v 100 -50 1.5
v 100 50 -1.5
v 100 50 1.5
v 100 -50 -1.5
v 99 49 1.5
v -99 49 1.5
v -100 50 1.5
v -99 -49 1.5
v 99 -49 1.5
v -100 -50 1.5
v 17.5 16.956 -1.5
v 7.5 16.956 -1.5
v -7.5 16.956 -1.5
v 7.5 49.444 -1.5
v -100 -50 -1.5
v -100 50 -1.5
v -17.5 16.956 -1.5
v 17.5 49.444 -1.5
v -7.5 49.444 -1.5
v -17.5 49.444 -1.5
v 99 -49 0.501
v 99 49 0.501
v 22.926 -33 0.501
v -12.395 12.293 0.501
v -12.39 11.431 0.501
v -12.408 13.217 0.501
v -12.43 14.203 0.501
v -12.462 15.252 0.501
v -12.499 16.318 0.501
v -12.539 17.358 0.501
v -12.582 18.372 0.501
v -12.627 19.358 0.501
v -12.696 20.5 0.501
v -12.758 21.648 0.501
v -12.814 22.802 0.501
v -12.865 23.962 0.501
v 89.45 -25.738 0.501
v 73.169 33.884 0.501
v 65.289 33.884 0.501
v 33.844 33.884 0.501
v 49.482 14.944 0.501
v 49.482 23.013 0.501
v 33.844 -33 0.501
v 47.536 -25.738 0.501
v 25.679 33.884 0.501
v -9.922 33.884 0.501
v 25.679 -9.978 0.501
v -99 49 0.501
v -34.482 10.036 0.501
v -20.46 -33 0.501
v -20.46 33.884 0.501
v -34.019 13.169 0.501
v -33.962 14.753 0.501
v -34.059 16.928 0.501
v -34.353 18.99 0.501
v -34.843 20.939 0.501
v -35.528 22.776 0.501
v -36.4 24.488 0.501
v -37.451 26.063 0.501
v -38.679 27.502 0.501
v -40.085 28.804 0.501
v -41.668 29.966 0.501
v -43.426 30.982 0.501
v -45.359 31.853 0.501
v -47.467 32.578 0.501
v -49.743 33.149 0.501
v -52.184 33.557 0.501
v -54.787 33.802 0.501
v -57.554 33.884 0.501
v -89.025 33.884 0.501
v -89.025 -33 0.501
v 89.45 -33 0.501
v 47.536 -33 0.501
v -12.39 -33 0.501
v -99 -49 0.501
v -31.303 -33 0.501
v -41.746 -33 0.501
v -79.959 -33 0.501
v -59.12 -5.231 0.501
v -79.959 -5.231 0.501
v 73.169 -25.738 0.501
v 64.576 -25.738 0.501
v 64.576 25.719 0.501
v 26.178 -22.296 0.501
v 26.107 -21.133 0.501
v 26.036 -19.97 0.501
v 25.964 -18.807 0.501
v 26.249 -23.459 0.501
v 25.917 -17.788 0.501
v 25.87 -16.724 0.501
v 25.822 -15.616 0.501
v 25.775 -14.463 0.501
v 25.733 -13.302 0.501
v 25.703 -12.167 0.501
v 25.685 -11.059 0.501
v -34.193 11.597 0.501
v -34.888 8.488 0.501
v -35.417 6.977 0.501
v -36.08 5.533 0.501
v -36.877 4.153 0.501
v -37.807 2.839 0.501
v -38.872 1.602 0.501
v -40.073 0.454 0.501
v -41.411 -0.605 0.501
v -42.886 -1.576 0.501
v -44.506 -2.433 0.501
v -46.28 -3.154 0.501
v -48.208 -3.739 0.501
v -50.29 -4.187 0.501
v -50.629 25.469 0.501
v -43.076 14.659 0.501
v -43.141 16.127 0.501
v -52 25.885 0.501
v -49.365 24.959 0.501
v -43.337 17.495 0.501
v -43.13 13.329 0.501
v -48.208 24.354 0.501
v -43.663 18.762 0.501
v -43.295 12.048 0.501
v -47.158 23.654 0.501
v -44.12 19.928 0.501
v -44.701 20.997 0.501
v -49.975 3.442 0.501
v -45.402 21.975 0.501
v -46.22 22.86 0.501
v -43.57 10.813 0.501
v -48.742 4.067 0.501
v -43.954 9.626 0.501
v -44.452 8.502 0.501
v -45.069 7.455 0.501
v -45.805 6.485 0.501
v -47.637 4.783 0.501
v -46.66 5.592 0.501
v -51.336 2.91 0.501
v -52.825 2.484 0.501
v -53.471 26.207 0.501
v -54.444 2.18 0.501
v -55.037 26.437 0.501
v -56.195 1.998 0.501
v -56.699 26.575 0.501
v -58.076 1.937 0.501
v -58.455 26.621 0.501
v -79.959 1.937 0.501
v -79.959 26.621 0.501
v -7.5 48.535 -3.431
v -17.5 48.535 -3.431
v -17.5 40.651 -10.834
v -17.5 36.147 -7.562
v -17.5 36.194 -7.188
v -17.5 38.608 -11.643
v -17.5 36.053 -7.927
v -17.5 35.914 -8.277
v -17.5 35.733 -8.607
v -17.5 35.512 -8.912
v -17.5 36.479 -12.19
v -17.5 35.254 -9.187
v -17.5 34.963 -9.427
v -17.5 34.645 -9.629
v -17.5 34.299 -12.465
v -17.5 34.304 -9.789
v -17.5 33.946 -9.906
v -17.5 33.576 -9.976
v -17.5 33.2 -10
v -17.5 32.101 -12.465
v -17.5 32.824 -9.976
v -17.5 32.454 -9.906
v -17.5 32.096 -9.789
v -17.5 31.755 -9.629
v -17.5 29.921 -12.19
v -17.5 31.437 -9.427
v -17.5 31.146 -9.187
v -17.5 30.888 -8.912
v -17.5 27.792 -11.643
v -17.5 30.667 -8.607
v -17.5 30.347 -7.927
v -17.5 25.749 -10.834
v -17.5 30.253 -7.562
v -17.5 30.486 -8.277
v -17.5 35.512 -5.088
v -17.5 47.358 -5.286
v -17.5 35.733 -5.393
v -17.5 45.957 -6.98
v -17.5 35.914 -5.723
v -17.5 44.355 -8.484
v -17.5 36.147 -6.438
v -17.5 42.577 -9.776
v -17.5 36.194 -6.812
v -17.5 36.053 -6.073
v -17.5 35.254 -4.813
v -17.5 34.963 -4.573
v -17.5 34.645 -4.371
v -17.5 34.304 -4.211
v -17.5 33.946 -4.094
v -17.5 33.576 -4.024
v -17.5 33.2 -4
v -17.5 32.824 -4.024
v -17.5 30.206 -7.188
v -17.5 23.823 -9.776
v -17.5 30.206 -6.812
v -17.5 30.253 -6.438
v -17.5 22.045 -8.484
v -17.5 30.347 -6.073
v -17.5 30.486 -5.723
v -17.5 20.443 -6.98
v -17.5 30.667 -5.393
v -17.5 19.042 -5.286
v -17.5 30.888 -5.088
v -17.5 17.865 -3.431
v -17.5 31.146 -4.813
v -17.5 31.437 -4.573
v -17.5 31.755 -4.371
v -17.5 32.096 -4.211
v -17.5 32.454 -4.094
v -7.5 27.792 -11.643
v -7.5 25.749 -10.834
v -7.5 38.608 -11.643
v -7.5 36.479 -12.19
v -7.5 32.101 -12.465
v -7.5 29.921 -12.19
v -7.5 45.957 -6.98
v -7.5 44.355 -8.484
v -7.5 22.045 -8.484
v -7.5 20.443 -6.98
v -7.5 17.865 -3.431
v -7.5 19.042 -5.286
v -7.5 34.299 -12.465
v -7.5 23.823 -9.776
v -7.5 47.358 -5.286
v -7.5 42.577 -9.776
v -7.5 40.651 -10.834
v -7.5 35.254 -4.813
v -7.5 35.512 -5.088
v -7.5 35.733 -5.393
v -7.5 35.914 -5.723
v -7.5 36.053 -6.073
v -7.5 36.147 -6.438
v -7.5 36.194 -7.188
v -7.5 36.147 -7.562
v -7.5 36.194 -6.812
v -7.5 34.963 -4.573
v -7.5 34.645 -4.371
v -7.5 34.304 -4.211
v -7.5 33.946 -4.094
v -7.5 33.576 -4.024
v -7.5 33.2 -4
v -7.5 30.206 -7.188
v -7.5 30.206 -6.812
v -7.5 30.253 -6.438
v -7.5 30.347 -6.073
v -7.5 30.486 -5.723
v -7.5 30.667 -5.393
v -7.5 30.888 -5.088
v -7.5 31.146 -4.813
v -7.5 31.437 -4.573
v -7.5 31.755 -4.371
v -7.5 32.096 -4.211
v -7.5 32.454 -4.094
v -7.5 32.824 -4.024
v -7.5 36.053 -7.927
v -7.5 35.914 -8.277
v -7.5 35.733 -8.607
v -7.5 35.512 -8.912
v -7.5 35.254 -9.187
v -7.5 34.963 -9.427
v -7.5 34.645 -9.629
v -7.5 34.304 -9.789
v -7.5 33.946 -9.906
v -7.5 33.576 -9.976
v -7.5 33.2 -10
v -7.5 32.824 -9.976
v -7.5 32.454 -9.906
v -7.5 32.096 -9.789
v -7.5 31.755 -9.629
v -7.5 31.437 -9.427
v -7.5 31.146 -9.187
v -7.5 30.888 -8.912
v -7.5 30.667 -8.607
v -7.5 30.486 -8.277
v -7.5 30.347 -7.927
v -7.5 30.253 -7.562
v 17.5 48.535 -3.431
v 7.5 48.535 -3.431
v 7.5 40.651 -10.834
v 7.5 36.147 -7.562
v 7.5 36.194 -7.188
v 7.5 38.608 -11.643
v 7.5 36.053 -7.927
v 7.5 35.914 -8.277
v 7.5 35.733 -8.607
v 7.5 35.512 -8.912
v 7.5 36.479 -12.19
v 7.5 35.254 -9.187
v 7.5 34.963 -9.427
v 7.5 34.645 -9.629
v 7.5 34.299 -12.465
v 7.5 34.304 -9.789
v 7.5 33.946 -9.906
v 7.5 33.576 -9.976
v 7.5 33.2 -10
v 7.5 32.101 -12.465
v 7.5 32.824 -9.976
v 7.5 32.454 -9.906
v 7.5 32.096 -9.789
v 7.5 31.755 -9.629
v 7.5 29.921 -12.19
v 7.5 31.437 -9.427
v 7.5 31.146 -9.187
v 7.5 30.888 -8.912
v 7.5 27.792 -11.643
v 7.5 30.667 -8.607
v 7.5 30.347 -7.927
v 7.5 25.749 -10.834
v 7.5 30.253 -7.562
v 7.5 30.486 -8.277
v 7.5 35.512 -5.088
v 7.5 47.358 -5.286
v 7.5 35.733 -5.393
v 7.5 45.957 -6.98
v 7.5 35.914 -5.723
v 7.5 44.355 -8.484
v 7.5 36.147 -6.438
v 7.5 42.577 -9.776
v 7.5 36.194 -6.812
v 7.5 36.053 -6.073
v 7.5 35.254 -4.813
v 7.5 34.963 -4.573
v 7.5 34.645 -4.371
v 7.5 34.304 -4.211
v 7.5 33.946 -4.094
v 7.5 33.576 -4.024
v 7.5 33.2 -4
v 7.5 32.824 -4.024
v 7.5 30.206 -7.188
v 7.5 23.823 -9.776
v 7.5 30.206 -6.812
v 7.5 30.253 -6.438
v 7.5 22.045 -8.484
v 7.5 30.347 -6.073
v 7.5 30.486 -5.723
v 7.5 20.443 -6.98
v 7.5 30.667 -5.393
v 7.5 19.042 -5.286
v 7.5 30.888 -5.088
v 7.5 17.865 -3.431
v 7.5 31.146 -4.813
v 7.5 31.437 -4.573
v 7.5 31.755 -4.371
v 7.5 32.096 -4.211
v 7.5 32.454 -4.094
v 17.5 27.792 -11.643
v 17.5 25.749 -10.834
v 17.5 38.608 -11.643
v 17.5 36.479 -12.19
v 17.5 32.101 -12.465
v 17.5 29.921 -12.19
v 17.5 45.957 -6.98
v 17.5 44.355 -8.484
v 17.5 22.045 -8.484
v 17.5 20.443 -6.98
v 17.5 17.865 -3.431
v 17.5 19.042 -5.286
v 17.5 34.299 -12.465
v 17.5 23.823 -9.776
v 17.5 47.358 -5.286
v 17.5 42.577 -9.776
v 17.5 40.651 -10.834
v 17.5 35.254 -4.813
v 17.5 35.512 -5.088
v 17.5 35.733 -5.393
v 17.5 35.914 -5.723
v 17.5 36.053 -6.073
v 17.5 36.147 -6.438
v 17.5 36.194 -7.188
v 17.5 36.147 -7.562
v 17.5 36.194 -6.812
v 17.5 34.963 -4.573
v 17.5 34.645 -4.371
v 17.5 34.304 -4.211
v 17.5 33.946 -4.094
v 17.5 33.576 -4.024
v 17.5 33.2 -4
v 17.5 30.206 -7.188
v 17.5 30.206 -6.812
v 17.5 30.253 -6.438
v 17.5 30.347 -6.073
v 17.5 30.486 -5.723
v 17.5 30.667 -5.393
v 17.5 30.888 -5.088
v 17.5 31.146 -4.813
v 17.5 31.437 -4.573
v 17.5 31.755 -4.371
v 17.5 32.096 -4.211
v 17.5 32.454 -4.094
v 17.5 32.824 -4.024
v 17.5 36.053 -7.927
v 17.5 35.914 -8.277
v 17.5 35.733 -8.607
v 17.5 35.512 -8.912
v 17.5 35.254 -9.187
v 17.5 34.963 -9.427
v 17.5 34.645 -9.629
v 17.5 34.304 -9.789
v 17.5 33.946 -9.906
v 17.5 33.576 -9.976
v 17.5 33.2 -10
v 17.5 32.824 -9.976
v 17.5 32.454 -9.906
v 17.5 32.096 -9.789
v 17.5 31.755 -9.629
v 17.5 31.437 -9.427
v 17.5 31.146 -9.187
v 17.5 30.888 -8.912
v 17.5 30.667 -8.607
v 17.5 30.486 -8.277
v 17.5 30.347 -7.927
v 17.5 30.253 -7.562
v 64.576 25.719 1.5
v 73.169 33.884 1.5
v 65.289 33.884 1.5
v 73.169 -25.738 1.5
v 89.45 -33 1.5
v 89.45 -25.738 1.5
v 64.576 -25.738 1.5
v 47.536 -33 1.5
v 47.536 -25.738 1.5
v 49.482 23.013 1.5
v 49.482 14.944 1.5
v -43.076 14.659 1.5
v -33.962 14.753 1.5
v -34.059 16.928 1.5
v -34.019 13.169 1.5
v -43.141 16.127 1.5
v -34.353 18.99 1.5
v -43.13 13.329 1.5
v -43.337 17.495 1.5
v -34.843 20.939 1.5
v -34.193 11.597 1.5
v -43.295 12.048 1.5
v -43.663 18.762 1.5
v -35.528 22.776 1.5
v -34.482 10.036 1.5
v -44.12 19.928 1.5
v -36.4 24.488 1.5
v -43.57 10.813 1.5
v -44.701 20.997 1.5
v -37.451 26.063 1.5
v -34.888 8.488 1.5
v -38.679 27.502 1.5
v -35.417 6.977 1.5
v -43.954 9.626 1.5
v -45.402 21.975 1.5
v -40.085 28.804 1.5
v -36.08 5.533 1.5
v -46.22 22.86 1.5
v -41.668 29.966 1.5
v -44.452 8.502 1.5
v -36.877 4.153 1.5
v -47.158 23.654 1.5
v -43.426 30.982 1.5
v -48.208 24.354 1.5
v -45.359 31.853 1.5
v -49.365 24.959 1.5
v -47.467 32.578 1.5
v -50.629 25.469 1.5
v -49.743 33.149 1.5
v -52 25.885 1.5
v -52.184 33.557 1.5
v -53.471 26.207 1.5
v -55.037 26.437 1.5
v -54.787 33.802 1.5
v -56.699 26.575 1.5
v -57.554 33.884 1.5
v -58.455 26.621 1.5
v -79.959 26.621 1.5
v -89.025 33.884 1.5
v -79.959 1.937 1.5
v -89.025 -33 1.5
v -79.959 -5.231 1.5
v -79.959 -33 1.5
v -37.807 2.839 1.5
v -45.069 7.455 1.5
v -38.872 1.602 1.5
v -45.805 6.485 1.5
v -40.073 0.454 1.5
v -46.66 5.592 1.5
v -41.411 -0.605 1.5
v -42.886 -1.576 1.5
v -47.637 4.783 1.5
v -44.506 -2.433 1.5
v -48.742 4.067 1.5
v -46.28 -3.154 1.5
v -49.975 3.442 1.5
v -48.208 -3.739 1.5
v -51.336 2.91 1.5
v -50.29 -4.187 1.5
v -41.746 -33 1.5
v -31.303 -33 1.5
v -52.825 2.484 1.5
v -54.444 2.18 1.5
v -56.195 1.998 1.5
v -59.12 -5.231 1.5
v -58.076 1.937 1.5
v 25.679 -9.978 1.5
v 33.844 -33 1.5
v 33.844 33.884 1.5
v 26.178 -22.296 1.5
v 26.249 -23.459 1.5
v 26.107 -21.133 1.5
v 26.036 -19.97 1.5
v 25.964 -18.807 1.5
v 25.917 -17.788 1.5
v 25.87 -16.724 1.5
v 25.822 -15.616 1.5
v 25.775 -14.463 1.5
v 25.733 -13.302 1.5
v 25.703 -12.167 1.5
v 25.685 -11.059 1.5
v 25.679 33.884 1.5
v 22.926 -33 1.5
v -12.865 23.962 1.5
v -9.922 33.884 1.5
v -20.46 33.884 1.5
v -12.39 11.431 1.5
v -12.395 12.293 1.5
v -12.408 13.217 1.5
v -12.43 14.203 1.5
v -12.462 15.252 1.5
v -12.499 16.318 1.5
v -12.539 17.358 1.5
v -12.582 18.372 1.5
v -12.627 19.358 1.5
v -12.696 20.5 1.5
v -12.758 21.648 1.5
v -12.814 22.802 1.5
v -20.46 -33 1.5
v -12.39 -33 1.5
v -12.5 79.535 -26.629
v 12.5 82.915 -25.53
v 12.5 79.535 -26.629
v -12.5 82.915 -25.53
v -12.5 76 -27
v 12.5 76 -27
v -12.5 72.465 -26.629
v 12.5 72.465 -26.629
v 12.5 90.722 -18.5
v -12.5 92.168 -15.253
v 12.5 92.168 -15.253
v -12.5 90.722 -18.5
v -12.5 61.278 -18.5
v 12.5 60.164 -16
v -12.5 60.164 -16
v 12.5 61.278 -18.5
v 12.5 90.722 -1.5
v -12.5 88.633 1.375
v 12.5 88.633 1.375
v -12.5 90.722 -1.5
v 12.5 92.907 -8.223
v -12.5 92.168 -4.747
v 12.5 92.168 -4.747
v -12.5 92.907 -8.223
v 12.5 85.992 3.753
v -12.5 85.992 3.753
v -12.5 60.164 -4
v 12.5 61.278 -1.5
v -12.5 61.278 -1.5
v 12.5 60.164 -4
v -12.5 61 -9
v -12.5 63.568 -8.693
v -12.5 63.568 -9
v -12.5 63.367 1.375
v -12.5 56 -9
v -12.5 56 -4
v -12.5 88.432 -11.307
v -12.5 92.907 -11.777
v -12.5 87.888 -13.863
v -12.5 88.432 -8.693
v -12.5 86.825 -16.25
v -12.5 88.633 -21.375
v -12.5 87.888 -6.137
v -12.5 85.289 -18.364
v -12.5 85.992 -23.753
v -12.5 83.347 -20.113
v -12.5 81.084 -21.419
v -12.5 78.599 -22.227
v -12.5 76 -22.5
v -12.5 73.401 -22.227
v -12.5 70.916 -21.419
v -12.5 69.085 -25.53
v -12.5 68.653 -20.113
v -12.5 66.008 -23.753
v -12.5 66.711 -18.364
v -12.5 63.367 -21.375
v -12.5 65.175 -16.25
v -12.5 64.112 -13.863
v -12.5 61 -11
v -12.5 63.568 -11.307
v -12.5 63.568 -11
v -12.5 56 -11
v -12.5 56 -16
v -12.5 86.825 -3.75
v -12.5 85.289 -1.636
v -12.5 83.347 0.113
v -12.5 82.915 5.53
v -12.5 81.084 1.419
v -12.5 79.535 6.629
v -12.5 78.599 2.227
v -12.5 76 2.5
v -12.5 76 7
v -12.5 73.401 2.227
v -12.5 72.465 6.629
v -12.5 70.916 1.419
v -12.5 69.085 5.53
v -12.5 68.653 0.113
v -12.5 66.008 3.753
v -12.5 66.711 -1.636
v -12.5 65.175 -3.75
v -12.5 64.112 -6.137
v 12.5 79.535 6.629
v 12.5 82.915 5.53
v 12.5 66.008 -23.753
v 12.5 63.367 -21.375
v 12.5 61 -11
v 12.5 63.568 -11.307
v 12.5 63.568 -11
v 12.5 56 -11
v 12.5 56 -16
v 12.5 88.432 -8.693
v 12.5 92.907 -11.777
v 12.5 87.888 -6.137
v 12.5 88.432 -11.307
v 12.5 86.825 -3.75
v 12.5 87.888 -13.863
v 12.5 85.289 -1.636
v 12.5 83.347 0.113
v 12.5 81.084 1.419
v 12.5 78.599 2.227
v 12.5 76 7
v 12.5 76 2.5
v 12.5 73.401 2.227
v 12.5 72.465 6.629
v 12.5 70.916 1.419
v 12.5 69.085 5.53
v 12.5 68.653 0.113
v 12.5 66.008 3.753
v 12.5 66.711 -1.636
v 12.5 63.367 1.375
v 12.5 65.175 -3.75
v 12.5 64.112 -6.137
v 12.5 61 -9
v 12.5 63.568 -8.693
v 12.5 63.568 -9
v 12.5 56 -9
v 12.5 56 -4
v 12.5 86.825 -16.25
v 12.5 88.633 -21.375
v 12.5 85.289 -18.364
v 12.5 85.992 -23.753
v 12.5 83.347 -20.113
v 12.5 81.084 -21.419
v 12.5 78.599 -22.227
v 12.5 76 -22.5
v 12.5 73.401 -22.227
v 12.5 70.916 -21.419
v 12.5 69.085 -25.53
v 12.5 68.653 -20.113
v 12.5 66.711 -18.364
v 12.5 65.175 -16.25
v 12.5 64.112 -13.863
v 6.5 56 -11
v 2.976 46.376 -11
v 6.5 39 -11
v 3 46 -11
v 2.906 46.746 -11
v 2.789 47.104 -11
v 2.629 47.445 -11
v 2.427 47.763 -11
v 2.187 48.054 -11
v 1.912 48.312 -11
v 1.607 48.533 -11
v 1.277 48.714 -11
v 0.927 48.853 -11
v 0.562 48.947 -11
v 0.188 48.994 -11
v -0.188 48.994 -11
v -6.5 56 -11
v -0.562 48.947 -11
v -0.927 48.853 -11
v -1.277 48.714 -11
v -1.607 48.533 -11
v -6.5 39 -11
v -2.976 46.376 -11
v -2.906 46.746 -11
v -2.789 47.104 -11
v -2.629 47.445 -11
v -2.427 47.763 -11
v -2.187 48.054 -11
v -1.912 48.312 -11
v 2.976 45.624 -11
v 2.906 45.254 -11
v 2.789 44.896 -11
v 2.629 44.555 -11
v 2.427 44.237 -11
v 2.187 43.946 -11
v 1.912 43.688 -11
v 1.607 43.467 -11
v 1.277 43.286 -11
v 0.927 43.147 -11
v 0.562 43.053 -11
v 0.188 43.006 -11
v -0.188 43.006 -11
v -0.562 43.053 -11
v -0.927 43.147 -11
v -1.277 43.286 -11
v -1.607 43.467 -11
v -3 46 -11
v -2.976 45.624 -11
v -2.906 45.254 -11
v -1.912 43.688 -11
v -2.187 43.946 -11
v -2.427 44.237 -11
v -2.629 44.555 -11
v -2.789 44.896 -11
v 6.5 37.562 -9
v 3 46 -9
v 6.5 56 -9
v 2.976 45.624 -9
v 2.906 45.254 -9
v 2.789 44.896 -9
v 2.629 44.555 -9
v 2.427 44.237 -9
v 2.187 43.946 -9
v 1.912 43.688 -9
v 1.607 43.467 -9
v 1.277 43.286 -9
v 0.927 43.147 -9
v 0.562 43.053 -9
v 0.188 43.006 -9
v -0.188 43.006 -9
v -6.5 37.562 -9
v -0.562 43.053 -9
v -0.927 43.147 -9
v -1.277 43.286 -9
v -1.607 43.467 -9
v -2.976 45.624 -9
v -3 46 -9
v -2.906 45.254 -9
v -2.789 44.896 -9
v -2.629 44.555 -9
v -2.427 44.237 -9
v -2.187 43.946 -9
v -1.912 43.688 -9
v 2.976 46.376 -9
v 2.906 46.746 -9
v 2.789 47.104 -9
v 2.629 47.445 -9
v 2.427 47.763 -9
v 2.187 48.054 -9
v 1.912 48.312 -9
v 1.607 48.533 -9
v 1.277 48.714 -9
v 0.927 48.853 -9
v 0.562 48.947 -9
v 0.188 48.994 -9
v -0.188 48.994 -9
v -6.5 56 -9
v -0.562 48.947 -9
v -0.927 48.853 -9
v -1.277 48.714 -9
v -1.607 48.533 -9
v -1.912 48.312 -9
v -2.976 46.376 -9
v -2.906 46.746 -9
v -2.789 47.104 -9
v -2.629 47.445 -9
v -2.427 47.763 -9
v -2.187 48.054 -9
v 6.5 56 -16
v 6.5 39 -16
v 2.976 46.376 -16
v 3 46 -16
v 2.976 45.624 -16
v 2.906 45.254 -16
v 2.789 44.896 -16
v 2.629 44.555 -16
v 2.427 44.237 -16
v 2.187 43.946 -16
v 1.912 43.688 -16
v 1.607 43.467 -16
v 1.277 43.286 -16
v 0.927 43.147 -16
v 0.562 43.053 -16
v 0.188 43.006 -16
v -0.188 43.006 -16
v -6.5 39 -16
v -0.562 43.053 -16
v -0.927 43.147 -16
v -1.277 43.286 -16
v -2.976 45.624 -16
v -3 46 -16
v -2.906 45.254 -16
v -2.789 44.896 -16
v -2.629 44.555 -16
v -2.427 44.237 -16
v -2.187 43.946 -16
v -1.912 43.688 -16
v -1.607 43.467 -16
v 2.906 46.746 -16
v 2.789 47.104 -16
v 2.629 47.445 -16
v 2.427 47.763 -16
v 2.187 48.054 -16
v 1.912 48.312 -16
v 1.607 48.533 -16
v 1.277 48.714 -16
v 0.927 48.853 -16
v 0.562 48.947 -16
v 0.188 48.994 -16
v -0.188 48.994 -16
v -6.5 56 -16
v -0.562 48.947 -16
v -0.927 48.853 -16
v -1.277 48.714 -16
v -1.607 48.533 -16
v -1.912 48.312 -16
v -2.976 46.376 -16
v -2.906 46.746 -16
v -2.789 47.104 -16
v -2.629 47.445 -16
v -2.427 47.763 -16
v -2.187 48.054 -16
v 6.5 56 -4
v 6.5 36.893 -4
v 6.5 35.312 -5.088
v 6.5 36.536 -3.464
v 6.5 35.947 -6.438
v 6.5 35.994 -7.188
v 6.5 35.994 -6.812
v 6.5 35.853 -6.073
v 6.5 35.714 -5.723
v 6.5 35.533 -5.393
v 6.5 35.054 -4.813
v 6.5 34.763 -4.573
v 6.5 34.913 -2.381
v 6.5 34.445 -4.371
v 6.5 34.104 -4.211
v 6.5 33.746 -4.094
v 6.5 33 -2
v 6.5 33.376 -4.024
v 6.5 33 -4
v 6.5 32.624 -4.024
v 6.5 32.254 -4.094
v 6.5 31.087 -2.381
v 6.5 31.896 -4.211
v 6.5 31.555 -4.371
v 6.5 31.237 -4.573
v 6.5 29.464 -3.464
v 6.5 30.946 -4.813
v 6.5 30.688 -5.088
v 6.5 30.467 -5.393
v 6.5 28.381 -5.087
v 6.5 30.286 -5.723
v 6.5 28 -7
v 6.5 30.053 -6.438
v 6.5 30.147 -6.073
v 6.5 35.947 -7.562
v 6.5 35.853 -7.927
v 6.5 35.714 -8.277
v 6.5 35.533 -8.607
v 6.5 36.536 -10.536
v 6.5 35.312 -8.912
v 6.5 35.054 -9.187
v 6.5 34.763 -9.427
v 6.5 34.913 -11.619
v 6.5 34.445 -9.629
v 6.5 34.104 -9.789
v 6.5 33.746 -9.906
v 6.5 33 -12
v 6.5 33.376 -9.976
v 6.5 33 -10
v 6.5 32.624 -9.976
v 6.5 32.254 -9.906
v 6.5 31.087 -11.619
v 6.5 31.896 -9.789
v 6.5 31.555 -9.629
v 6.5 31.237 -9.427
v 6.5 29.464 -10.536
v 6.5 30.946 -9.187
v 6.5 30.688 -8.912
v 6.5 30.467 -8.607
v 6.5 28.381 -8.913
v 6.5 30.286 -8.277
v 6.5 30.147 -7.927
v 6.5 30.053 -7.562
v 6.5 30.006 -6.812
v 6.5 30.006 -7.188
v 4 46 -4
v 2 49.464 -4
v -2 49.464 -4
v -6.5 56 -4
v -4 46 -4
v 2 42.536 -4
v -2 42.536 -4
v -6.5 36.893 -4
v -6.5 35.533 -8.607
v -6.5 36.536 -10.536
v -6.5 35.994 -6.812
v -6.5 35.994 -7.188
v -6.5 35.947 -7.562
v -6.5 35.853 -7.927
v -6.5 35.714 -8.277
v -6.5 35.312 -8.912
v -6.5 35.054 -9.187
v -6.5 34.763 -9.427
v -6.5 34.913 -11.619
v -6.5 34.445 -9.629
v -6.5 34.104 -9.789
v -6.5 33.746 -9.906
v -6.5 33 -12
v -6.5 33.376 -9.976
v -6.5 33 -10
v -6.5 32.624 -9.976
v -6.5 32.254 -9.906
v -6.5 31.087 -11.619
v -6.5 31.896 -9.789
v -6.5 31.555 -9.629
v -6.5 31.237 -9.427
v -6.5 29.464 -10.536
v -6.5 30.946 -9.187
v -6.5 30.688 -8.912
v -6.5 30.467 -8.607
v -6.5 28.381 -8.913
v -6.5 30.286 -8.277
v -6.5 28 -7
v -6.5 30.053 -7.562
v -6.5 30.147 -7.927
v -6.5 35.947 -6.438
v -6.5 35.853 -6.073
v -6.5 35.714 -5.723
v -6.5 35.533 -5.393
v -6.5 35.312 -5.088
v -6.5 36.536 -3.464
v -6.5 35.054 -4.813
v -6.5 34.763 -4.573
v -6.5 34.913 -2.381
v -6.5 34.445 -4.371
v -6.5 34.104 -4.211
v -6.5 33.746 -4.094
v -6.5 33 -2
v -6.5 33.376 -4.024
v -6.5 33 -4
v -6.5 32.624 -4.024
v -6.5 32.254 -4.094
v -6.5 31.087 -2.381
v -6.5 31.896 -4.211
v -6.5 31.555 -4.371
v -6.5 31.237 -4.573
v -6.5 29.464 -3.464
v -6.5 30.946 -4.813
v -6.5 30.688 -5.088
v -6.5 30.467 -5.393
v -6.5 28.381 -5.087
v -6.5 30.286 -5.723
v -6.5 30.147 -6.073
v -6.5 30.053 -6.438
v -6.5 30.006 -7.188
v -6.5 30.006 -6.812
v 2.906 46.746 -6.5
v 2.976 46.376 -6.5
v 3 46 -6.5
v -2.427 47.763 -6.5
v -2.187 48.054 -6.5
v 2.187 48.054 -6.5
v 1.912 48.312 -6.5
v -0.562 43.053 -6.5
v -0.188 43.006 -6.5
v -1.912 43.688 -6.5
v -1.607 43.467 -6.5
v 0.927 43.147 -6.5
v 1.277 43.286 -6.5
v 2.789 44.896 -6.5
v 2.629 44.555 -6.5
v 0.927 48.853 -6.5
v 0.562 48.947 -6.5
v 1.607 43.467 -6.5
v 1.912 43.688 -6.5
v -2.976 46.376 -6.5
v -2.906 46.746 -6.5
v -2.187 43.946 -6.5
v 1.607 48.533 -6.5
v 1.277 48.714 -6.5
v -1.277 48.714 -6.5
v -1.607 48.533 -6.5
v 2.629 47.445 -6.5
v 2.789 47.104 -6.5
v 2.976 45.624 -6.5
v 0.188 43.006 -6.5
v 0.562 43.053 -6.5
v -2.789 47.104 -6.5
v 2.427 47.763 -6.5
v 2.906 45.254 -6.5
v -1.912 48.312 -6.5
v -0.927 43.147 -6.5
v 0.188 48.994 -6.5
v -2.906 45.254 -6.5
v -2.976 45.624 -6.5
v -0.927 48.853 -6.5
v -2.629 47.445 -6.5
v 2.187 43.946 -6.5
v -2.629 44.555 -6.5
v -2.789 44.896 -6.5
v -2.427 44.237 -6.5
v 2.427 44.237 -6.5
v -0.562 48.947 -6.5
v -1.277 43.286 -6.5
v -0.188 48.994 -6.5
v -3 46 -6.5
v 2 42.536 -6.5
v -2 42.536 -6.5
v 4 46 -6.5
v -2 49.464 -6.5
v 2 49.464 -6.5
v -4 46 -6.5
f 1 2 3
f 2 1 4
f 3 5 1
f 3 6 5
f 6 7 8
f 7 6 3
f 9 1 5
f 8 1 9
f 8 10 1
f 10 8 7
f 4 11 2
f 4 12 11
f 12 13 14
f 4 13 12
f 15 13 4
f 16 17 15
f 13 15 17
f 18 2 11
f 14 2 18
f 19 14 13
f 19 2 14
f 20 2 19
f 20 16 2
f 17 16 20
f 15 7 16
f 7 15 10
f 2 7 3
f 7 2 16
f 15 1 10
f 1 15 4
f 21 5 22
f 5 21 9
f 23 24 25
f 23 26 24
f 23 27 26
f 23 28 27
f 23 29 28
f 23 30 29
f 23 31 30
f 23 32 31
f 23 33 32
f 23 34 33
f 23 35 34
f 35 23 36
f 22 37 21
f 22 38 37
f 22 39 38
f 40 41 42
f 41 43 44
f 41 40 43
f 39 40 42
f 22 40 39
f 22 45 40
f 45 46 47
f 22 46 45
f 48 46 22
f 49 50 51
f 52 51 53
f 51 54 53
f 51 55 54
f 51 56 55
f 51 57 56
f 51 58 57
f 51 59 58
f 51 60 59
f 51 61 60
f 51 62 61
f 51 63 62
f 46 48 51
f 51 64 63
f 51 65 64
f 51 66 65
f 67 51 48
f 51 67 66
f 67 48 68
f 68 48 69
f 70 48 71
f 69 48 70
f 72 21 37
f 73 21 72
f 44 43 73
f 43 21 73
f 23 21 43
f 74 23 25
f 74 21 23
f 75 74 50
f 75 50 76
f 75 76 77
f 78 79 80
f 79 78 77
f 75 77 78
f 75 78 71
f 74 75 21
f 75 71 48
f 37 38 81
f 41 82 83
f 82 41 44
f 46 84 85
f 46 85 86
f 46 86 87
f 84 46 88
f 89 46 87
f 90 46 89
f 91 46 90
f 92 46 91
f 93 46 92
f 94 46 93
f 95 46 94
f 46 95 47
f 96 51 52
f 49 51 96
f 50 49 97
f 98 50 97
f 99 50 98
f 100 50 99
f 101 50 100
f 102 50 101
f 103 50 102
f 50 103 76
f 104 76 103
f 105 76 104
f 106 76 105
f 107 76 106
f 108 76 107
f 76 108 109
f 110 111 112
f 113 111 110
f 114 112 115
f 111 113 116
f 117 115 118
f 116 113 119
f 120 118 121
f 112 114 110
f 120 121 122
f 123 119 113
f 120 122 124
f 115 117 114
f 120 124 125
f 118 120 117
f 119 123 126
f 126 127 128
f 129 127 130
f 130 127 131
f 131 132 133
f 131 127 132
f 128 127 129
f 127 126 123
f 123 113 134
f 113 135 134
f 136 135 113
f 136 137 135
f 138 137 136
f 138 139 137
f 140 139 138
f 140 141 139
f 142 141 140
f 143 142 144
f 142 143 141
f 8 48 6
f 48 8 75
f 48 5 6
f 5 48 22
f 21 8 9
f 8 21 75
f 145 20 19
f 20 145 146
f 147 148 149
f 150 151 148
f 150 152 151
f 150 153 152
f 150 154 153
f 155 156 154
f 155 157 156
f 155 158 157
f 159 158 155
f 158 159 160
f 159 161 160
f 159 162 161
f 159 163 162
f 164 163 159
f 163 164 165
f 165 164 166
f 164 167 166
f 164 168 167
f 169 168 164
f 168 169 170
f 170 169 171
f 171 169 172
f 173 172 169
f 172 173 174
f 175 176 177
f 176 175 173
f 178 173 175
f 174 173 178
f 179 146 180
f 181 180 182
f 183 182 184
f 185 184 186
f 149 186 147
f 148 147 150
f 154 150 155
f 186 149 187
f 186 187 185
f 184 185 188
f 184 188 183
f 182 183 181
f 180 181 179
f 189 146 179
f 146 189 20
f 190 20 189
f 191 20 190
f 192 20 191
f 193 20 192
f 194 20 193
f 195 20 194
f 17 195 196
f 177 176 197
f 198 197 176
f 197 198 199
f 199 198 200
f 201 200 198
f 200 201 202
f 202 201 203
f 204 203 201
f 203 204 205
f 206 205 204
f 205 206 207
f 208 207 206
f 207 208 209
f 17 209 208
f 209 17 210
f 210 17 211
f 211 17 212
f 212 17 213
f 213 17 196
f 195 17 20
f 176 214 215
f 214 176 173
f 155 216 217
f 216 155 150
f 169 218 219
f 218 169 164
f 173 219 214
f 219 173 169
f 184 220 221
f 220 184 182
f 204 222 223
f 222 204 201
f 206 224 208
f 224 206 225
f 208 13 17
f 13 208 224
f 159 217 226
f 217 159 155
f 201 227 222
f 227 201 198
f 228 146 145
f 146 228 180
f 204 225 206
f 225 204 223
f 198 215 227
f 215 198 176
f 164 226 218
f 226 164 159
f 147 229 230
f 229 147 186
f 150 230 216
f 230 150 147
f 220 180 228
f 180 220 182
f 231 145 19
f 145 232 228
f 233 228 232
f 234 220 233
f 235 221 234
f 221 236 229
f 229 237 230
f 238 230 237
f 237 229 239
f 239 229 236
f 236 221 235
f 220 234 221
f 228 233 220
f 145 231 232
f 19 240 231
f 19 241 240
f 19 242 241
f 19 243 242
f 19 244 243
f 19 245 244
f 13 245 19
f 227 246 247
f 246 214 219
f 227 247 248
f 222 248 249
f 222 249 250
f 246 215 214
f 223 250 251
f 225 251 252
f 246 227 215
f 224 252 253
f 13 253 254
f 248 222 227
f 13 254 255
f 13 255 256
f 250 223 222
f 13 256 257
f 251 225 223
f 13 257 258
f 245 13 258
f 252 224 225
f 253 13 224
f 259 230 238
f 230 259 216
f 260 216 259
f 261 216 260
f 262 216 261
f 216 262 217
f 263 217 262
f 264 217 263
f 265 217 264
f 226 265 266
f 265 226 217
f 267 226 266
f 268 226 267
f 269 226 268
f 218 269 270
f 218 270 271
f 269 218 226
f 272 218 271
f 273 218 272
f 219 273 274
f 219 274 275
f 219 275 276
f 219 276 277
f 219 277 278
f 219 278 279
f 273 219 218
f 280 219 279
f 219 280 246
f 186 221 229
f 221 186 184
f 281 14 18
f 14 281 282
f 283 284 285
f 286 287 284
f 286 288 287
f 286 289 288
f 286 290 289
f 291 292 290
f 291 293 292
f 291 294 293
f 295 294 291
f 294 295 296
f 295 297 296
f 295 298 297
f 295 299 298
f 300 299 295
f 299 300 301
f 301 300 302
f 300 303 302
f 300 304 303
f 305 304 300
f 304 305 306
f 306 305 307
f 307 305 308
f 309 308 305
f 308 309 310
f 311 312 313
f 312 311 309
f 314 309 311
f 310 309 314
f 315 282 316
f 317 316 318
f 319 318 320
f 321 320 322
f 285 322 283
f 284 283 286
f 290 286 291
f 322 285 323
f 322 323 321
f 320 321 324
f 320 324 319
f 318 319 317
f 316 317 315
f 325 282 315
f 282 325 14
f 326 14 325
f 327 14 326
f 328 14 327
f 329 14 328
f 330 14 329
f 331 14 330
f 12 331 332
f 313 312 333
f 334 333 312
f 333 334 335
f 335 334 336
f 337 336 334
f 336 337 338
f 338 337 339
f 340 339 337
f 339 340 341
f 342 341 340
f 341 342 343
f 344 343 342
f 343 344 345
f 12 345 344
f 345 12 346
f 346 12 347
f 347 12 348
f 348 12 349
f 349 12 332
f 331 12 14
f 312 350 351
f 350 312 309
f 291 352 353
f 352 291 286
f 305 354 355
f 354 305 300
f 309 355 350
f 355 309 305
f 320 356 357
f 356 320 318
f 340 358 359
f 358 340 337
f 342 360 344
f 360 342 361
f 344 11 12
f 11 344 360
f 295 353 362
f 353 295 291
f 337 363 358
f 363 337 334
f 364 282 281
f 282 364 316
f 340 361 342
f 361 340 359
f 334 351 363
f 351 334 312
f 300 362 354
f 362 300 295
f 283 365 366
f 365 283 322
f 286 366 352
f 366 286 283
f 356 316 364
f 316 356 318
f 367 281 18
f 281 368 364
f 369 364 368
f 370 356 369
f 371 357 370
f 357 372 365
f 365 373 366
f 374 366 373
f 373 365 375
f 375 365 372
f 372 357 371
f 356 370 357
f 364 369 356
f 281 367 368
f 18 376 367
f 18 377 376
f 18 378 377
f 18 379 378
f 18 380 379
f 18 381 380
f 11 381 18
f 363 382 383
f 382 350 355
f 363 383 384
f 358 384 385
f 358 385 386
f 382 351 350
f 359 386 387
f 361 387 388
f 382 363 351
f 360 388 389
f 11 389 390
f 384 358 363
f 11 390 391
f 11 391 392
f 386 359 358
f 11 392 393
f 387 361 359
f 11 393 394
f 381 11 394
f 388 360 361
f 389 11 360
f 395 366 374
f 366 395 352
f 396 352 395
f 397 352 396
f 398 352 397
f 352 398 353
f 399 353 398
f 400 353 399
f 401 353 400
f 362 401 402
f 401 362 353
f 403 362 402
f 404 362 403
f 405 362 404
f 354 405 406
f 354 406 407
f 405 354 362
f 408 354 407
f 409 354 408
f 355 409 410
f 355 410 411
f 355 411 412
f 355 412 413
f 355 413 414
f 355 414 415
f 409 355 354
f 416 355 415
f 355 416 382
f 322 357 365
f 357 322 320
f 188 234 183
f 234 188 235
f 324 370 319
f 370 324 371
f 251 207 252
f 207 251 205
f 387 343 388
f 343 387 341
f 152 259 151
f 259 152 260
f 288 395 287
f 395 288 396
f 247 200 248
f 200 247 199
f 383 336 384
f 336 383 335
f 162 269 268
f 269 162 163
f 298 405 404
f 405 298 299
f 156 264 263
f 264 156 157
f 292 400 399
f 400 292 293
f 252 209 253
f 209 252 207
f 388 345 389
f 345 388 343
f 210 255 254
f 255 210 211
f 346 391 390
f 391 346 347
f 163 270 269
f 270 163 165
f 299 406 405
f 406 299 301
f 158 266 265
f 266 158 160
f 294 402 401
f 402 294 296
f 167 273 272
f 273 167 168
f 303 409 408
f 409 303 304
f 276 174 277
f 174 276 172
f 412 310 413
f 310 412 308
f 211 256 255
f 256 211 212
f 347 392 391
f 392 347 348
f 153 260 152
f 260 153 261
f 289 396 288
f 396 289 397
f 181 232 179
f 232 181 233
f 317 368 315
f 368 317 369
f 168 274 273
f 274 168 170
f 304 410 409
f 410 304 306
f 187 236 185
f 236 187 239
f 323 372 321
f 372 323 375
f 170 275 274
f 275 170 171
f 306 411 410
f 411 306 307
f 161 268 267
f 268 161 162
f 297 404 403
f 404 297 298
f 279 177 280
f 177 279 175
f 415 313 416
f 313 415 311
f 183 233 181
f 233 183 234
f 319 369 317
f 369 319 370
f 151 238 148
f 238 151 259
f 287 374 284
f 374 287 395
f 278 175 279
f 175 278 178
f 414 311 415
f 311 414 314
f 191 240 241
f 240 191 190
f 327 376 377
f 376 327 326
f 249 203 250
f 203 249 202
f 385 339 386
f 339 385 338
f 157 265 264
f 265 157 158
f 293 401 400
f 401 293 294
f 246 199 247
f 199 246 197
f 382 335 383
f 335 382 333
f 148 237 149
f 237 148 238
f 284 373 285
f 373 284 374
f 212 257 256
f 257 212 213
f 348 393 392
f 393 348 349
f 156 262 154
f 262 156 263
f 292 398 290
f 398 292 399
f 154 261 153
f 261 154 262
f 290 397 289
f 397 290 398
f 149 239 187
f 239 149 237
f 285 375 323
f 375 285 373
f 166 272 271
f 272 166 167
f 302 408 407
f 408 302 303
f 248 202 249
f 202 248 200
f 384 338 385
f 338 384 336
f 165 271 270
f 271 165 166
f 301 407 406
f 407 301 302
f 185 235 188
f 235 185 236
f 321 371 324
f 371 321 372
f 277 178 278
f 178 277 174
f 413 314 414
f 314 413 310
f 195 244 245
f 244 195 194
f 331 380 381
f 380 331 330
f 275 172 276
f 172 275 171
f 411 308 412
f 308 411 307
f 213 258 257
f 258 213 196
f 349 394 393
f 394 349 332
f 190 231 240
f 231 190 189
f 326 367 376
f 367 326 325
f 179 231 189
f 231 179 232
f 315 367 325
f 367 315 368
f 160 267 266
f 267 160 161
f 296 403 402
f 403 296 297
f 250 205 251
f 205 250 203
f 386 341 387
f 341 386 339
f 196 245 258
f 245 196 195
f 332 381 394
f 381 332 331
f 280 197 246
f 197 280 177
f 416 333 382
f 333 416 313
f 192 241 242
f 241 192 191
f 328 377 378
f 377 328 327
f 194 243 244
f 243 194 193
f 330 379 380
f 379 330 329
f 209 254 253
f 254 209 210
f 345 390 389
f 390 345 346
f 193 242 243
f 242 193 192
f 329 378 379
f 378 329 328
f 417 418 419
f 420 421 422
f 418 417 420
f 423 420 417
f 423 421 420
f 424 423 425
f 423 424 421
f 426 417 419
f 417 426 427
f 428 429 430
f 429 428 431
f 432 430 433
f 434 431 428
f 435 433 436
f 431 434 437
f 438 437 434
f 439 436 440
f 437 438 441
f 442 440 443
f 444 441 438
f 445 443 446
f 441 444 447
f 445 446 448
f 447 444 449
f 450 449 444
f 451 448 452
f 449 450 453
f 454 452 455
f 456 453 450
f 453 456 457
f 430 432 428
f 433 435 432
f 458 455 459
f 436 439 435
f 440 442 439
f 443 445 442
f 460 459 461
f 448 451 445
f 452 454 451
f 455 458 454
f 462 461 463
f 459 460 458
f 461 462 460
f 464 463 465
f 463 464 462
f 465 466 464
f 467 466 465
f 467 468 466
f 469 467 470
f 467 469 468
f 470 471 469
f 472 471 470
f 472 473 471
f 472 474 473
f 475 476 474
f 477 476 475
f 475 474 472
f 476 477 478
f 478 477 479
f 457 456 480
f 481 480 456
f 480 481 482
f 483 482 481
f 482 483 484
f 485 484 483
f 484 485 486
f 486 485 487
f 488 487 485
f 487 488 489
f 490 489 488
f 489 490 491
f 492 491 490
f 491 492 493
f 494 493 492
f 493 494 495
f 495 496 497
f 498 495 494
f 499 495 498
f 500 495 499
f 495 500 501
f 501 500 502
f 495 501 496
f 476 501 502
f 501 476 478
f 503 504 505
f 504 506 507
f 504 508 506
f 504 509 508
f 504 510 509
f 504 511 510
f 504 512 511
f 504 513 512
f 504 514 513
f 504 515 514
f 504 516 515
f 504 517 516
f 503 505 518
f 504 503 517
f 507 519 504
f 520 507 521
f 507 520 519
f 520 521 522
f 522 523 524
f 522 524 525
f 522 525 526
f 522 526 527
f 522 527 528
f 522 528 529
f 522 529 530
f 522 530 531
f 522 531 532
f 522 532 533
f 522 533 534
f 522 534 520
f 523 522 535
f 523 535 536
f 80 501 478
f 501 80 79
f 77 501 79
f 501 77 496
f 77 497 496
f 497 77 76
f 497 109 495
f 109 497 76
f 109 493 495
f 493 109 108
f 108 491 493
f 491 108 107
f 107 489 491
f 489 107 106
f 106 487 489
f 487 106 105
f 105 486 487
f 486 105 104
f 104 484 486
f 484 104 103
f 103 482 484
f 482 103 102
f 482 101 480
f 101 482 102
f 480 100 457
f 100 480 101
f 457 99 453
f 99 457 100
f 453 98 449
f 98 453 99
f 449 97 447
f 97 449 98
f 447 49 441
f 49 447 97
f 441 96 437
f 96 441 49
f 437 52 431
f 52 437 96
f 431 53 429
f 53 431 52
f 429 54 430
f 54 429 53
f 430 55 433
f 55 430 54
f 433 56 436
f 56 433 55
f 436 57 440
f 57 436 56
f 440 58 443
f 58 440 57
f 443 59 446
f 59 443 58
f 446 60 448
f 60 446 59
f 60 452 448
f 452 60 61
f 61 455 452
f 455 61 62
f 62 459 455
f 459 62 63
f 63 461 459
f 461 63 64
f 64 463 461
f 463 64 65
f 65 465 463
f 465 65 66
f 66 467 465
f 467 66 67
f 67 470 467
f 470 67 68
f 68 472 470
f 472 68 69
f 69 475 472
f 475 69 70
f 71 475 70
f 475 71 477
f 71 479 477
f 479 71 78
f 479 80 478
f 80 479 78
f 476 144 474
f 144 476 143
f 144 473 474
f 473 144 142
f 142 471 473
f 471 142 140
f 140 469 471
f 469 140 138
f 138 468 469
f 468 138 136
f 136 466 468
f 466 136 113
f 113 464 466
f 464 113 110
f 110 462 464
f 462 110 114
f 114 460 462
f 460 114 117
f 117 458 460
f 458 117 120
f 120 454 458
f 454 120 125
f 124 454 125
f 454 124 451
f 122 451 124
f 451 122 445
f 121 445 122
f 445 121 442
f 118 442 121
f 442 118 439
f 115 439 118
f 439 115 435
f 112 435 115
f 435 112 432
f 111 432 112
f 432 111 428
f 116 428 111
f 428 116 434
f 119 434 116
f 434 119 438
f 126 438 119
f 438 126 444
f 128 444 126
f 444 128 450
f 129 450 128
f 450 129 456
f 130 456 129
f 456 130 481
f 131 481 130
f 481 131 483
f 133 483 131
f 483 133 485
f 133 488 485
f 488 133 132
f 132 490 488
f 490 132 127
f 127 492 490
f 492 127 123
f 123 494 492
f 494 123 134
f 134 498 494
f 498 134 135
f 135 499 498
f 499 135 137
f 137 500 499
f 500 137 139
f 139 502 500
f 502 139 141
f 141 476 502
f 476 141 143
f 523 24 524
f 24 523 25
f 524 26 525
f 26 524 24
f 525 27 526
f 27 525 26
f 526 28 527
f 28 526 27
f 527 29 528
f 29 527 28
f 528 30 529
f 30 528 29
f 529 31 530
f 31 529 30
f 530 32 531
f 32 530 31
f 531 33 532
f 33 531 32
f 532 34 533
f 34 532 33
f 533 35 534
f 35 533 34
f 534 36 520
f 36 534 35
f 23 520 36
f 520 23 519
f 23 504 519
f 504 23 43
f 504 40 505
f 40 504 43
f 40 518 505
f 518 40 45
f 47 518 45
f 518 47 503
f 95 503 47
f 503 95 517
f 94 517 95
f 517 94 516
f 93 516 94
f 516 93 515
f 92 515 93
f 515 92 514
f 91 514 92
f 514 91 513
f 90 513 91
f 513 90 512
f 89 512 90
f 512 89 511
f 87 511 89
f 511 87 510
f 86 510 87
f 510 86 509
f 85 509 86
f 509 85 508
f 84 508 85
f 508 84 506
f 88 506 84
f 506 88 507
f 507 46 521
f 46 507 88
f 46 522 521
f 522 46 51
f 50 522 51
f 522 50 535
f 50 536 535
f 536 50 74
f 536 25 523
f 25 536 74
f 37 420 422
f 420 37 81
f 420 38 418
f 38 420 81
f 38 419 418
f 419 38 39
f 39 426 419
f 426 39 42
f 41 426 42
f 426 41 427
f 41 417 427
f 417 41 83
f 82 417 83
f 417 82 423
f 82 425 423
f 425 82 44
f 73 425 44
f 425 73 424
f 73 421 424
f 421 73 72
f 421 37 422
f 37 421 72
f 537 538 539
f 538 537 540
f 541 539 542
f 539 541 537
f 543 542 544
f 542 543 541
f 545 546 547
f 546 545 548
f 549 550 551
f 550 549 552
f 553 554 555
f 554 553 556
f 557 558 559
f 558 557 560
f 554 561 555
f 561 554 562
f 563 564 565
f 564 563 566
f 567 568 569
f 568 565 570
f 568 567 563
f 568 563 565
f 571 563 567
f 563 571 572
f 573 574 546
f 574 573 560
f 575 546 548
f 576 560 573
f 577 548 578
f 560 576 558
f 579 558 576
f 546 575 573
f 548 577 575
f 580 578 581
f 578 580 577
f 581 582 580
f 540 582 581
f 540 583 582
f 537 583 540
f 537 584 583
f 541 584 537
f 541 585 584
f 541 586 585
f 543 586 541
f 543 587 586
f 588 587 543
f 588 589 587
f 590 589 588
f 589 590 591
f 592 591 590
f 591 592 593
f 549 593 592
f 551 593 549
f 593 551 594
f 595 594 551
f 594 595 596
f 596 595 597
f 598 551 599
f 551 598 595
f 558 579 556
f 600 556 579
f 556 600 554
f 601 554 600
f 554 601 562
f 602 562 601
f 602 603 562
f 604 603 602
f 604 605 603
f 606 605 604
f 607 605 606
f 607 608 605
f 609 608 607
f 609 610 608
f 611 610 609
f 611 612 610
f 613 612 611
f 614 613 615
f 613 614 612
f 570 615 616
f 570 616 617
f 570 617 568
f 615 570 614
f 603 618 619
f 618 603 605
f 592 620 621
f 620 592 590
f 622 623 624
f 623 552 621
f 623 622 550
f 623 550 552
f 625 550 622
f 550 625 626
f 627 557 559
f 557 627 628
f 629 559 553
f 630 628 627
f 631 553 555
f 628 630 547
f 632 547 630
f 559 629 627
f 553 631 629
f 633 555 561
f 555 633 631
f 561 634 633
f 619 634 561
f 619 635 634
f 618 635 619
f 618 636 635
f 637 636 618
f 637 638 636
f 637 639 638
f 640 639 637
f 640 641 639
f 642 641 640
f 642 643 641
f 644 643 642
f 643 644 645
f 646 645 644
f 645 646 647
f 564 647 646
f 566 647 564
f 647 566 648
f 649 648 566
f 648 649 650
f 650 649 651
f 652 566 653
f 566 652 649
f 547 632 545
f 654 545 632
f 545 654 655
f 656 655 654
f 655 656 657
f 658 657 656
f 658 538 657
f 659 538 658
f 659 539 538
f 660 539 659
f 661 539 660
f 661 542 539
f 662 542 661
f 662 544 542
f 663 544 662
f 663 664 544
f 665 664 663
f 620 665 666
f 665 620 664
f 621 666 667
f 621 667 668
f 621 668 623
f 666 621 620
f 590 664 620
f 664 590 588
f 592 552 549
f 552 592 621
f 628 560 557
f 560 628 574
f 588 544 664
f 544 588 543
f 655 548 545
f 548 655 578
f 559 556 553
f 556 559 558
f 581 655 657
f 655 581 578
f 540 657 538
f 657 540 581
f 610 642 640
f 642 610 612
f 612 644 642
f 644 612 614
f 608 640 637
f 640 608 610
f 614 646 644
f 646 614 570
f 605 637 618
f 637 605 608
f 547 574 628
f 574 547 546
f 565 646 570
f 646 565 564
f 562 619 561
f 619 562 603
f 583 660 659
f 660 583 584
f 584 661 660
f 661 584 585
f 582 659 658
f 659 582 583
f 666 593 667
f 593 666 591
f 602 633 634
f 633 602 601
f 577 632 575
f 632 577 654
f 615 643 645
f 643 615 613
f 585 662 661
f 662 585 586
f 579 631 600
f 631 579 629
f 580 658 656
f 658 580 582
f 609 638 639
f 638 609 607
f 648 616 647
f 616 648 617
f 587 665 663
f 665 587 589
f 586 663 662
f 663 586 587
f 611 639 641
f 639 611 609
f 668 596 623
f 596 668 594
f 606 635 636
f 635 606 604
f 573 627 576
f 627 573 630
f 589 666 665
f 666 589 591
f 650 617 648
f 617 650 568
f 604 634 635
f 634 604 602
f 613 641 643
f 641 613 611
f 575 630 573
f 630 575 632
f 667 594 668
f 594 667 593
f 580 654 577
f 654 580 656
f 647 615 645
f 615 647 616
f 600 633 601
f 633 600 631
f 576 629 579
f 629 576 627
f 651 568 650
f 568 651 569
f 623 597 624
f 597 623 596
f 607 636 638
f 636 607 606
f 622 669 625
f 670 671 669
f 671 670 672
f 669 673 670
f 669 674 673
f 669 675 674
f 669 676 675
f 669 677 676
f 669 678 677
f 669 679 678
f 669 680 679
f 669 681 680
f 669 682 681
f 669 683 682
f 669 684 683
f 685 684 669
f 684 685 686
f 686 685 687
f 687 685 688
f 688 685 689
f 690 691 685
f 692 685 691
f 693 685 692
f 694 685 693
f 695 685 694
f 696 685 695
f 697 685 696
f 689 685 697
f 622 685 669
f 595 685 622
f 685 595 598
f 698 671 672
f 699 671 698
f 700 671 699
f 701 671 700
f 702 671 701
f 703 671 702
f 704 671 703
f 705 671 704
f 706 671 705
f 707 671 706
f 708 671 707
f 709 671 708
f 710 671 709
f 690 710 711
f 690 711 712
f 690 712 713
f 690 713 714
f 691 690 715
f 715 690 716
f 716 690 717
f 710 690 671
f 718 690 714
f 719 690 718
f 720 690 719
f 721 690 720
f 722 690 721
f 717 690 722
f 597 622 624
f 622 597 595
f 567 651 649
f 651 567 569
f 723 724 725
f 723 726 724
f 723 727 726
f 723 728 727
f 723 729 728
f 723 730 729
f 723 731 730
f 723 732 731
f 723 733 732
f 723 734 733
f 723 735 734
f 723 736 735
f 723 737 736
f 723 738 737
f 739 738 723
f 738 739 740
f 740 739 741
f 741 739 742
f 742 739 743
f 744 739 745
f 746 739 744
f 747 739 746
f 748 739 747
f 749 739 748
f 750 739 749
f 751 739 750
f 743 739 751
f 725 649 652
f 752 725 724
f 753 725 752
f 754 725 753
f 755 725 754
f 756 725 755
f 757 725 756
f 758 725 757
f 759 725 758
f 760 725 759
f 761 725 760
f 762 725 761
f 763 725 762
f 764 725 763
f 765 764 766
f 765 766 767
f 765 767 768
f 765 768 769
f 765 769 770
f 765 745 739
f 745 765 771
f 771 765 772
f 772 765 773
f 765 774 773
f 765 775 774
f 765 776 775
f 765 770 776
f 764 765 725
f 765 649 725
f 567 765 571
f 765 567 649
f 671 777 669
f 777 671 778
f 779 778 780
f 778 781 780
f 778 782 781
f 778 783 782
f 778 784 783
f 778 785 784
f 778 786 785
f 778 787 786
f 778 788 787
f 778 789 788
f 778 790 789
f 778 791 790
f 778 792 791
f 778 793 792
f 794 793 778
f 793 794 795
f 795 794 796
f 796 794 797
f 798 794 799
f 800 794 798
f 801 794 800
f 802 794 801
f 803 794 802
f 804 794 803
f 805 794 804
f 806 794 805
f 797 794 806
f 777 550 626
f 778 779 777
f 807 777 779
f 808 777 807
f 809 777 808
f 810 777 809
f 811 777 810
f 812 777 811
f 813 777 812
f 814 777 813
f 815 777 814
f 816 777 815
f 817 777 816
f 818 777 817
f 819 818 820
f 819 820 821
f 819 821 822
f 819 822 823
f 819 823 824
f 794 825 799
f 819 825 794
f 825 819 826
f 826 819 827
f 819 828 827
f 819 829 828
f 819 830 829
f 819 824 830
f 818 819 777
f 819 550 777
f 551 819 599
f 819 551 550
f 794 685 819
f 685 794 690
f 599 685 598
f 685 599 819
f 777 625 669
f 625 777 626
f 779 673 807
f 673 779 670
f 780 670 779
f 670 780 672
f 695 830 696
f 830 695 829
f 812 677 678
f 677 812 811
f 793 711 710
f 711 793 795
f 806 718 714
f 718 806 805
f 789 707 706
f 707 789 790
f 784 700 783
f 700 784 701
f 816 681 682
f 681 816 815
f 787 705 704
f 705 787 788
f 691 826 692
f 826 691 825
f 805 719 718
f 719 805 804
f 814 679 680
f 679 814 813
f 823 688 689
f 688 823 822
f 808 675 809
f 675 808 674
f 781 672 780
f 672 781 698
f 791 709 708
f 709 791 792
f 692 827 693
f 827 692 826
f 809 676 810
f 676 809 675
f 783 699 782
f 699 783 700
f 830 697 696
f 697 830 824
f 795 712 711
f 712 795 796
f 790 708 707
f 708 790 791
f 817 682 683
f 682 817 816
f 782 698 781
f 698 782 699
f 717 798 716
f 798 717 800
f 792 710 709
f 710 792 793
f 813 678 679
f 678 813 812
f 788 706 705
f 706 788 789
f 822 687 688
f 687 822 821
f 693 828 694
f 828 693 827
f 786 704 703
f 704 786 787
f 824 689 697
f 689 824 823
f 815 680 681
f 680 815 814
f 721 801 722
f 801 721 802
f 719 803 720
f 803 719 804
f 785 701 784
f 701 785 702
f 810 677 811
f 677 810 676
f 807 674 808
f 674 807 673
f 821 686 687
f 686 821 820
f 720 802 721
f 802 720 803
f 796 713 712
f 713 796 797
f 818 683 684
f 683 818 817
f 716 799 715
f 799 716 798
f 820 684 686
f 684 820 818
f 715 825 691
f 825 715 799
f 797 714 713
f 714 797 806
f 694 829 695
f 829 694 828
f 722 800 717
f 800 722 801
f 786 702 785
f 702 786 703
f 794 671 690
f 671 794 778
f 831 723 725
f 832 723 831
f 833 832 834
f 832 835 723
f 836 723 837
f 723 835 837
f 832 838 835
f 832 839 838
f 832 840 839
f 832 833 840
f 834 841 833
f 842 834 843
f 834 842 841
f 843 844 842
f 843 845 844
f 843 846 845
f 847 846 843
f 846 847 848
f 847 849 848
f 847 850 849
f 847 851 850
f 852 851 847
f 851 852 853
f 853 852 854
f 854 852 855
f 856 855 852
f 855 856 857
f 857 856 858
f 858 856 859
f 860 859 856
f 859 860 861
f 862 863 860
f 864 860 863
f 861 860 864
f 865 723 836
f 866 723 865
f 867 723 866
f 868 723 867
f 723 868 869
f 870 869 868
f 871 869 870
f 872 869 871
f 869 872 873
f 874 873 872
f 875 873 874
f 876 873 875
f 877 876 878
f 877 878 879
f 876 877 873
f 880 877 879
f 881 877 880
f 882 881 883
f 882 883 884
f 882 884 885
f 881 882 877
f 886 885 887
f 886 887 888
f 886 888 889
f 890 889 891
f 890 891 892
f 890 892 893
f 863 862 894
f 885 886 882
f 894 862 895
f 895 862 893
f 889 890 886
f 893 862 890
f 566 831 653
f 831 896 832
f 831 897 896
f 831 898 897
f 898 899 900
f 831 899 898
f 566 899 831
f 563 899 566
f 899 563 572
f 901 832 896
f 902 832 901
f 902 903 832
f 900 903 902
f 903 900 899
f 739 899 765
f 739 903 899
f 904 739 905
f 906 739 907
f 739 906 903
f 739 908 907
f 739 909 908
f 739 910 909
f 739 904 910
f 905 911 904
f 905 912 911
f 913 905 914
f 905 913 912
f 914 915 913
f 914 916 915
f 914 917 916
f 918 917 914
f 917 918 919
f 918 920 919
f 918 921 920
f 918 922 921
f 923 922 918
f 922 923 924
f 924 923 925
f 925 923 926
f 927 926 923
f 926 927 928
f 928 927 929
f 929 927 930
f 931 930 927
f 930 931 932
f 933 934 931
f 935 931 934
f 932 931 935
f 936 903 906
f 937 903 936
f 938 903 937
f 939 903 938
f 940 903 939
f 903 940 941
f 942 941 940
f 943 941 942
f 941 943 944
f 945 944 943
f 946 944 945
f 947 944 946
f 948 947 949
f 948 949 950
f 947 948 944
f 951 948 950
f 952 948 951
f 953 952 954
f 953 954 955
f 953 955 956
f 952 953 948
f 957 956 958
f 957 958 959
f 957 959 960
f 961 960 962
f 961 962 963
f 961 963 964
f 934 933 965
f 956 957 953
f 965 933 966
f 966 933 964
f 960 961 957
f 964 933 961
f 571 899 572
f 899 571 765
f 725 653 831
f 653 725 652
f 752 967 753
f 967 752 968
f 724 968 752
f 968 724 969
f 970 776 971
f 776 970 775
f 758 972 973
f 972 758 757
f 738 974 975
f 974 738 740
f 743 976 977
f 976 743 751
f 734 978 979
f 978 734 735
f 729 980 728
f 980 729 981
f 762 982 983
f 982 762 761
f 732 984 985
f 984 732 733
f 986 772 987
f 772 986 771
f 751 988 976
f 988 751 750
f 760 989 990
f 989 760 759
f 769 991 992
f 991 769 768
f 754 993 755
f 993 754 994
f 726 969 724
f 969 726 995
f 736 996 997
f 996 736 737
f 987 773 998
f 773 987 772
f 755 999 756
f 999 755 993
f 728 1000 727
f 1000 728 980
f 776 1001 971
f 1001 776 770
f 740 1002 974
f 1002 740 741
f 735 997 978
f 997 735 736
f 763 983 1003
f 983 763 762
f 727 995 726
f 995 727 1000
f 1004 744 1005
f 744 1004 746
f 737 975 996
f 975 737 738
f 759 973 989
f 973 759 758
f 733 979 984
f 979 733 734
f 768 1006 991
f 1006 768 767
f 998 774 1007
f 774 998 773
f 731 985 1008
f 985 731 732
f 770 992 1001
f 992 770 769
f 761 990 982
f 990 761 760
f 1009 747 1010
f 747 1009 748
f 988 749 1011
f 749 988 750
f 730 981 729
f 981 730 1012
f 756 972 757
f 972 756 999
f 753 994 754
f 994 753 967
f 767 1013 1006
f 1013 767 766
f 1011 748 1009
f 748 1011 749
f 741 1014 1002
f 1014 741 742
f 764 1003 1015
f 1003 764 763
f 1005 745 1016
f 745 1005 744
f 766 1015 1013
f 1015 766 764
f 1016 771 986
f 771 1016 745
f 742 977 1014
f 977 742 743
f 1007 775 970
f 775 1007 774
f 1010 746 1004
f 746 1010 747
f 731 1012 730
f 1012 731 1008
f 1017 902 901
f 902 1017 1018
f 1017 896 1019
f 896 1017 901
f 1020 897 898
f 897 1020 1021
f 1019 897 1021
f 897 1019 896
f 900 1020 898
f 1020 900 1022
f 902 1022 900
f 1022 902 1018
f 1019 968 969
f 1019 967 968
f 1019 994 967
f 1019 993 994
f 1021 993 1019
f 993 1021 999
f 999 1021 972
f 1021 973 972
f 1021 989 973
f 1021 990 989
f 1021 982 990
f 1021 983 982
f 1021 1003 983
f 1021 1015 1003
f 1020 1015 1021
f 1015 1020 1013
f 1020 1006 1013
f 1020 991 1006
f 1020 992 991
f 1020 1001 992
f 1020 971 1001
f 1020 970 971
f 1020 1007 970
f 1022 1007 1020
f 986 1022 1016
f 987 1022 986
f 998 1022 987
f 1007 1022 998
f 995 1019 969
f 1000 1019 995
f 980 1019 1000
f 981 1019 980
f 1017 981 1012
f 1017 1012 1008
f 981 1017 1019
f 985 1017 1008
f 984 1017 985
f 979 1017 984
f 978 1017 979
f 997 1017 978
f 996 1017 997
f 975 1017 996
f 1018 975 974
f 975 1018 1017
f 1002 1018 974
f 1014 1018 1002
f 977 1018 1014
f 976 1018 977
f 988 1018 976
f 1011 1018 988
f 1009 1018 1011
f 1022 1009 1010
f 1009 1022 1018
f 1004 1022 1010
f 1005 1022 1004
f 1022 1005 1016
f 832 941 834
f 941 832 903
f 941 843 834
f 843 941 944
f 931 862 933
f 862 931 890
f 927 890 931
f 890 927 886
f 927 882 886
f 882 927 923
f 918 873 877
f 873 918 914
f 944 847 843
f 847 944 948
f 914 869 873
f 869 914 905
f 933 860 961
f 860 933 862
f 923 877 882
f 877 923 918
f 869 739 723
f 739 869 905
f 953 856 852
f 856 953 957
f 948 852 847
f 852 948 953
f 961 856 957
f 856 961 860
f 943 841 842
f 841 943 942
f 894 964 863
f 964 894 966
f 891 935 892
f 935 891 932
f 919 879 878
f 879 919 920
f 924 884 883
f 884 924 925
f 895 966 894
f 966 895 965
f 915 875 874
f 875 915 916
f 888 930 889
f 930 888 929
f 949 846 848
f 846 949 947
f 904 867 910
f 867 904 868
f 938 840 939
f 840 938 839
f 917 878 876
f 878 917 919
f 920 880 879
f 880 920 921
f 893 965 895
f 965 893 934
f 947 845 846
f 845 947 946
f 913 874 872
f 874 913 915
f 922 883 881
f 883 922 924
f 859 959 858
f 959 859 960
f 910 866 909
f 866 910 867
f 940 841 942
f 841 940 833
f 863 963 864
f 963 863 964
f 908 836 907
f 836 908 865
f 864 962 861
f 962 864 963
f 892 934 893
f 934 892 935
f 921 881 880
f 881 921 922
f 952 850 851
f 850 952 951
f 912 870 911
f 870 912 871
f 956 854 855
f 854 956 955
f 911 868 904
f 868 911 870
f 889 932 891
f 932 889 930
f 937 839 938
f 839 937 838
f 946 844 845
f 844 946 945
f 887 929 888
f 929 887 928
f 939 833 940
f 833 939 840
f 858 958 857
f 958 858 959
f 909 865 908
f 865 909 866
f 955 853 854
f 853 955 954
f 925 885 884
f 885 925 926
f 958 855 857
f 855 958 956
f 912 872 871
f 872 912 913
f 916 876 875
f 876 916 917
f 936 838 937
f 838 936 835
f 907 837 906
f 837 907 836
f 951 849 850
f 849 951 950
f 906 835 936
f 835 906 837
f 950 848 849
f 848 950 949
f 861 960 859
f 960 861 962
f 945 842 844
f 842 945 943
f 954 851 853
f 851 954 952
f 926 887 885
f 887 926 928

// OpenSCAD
 /**
 * @file golfbuggyNumberPlate.scad
 *
 * @version 1.0
 *
 * @author Calum Judd Anderson
 *
 * @brief Golfbuggy numberplate
 */
INTERFERENCE_FIT = 0.001;
SLIDE_FIT = 0.05;

NUMBERPLATE_REG = "RN1";

/**
 * @brief Handlebar mount
 */
module handlebarMount() {
    mountBracketWidth = 13;

    union() {
        rotate([0, 90, 0])
            difference() {
                cylinder(25, 17, 17, center=true);
                cylinder(25 + INTERFERENCE_FIT, 12.5, 12.5, center=true);
                translate([0, -8, 0])
                    cube([2, 25, 34 + INTERFERENCE_FIT], center=true);
            }
            
            /* Body Between Number Plate Mount and Handlebar Mount */
            /* Top Mount */
            translate([0, 0, -8.5])
                union() {
                    translate([0, -17.5, 5])
                        cube([25, 5, 5], center=true);
                    
                    translate([0, -30, 5])
                        difference() {
                            cube([mountBracketWidth, 20, 5], center=true);
                            cylinder(5 + INTERFERENCE_FIT, 3, 3, center=true, $fn=50);
                            translate([0, -12, 0])
                                cube([mountBracketWidth + INTERFERENCE_FIT, 10, 5 + INTERFERENCE_FIT], center=true);
                        }
                }

            /* Bottom Mount */
            union() {
                translate([0, -17.5, 3.5])
                    cube([25, 5, 5], center=true);

                translate([0, -30, 3.5])
                    difference() {
                            cube([mountBracketWidth, 20, 5], center=true);
                            cylinder(5 + INTERFERENCE_FIT, 3, 3, center=true, $fn=50);
                            translate([0, 0, 0])
                            cylinder(3, 4, 4, $fn=6);
                        }
            }

            /* Circle Pick Up Between Number Plate Mounts */
            translate([-0, -43, 3])
                difference() {
                    rotate([0, 90, 0])
                        cylinder(mountBracketWidth, 5, 5, center=true);
                    rotate([0, 90, 0])
                        cylinder(mountBracketWidth + INTERFERENCE_FIT, 3, 3, center=true, $fn=50);
                }
    }
}

/**
 * @brief The mounting bracket to affix the number plate to the buggy
 */
module mountingBracket() {
    bracketThickness = 10;
    bracketHeight = 17.5;
    bracketWidth = 50;

    difference() {
        union() {
            rotate([90, 0, 90])
                difference() {
                    cylinder(bracketThickness, bracketHeight, bracketHeight, center=true, $fn=50);
                    translate([0, 10, 0])
                        cube([50, 30, 20], center=true);
                }

            translate([25, 0, 0])
                rotate([90, 0, 90])
                    difference() {
                        cylinder(bracketThickness, bracketHeight, bracketHeight, center=true, $fn=50);
                        translate([0, 10, 0])
                            cube([50, 30, 20], center=true);
                    }
        }

        translate([12.5, 0, -12])
            rotate([0, 90, 0])
                cylinder(35 + INTERFERENCE_FIT, 3, 3, center=true, $fn=50);
    }
}

/**
 * @brief Creates a number plate
 */
module golfbuggyNumberPlate() {
    union() {

        difference() {
            color("black")
                cube([200, 100, 3], center=true);
            color("white")
                translate([0, 0, +1 + INTERFERENCE_FIT])
                    cube([198, 98, 1], center=true);
        }

        color("black")
            translate([-97, -33, 1])
                linear_extrude(1, center=true)
                    text(NUMBERPLATE_REG, size=70);

        translate([-12.5, 33.2, 5])
            mountingBracket();
    }
}

golfbuggyNumberPlate();

color("black")
    translate([0, 76, -10])
        handlebarMount();
